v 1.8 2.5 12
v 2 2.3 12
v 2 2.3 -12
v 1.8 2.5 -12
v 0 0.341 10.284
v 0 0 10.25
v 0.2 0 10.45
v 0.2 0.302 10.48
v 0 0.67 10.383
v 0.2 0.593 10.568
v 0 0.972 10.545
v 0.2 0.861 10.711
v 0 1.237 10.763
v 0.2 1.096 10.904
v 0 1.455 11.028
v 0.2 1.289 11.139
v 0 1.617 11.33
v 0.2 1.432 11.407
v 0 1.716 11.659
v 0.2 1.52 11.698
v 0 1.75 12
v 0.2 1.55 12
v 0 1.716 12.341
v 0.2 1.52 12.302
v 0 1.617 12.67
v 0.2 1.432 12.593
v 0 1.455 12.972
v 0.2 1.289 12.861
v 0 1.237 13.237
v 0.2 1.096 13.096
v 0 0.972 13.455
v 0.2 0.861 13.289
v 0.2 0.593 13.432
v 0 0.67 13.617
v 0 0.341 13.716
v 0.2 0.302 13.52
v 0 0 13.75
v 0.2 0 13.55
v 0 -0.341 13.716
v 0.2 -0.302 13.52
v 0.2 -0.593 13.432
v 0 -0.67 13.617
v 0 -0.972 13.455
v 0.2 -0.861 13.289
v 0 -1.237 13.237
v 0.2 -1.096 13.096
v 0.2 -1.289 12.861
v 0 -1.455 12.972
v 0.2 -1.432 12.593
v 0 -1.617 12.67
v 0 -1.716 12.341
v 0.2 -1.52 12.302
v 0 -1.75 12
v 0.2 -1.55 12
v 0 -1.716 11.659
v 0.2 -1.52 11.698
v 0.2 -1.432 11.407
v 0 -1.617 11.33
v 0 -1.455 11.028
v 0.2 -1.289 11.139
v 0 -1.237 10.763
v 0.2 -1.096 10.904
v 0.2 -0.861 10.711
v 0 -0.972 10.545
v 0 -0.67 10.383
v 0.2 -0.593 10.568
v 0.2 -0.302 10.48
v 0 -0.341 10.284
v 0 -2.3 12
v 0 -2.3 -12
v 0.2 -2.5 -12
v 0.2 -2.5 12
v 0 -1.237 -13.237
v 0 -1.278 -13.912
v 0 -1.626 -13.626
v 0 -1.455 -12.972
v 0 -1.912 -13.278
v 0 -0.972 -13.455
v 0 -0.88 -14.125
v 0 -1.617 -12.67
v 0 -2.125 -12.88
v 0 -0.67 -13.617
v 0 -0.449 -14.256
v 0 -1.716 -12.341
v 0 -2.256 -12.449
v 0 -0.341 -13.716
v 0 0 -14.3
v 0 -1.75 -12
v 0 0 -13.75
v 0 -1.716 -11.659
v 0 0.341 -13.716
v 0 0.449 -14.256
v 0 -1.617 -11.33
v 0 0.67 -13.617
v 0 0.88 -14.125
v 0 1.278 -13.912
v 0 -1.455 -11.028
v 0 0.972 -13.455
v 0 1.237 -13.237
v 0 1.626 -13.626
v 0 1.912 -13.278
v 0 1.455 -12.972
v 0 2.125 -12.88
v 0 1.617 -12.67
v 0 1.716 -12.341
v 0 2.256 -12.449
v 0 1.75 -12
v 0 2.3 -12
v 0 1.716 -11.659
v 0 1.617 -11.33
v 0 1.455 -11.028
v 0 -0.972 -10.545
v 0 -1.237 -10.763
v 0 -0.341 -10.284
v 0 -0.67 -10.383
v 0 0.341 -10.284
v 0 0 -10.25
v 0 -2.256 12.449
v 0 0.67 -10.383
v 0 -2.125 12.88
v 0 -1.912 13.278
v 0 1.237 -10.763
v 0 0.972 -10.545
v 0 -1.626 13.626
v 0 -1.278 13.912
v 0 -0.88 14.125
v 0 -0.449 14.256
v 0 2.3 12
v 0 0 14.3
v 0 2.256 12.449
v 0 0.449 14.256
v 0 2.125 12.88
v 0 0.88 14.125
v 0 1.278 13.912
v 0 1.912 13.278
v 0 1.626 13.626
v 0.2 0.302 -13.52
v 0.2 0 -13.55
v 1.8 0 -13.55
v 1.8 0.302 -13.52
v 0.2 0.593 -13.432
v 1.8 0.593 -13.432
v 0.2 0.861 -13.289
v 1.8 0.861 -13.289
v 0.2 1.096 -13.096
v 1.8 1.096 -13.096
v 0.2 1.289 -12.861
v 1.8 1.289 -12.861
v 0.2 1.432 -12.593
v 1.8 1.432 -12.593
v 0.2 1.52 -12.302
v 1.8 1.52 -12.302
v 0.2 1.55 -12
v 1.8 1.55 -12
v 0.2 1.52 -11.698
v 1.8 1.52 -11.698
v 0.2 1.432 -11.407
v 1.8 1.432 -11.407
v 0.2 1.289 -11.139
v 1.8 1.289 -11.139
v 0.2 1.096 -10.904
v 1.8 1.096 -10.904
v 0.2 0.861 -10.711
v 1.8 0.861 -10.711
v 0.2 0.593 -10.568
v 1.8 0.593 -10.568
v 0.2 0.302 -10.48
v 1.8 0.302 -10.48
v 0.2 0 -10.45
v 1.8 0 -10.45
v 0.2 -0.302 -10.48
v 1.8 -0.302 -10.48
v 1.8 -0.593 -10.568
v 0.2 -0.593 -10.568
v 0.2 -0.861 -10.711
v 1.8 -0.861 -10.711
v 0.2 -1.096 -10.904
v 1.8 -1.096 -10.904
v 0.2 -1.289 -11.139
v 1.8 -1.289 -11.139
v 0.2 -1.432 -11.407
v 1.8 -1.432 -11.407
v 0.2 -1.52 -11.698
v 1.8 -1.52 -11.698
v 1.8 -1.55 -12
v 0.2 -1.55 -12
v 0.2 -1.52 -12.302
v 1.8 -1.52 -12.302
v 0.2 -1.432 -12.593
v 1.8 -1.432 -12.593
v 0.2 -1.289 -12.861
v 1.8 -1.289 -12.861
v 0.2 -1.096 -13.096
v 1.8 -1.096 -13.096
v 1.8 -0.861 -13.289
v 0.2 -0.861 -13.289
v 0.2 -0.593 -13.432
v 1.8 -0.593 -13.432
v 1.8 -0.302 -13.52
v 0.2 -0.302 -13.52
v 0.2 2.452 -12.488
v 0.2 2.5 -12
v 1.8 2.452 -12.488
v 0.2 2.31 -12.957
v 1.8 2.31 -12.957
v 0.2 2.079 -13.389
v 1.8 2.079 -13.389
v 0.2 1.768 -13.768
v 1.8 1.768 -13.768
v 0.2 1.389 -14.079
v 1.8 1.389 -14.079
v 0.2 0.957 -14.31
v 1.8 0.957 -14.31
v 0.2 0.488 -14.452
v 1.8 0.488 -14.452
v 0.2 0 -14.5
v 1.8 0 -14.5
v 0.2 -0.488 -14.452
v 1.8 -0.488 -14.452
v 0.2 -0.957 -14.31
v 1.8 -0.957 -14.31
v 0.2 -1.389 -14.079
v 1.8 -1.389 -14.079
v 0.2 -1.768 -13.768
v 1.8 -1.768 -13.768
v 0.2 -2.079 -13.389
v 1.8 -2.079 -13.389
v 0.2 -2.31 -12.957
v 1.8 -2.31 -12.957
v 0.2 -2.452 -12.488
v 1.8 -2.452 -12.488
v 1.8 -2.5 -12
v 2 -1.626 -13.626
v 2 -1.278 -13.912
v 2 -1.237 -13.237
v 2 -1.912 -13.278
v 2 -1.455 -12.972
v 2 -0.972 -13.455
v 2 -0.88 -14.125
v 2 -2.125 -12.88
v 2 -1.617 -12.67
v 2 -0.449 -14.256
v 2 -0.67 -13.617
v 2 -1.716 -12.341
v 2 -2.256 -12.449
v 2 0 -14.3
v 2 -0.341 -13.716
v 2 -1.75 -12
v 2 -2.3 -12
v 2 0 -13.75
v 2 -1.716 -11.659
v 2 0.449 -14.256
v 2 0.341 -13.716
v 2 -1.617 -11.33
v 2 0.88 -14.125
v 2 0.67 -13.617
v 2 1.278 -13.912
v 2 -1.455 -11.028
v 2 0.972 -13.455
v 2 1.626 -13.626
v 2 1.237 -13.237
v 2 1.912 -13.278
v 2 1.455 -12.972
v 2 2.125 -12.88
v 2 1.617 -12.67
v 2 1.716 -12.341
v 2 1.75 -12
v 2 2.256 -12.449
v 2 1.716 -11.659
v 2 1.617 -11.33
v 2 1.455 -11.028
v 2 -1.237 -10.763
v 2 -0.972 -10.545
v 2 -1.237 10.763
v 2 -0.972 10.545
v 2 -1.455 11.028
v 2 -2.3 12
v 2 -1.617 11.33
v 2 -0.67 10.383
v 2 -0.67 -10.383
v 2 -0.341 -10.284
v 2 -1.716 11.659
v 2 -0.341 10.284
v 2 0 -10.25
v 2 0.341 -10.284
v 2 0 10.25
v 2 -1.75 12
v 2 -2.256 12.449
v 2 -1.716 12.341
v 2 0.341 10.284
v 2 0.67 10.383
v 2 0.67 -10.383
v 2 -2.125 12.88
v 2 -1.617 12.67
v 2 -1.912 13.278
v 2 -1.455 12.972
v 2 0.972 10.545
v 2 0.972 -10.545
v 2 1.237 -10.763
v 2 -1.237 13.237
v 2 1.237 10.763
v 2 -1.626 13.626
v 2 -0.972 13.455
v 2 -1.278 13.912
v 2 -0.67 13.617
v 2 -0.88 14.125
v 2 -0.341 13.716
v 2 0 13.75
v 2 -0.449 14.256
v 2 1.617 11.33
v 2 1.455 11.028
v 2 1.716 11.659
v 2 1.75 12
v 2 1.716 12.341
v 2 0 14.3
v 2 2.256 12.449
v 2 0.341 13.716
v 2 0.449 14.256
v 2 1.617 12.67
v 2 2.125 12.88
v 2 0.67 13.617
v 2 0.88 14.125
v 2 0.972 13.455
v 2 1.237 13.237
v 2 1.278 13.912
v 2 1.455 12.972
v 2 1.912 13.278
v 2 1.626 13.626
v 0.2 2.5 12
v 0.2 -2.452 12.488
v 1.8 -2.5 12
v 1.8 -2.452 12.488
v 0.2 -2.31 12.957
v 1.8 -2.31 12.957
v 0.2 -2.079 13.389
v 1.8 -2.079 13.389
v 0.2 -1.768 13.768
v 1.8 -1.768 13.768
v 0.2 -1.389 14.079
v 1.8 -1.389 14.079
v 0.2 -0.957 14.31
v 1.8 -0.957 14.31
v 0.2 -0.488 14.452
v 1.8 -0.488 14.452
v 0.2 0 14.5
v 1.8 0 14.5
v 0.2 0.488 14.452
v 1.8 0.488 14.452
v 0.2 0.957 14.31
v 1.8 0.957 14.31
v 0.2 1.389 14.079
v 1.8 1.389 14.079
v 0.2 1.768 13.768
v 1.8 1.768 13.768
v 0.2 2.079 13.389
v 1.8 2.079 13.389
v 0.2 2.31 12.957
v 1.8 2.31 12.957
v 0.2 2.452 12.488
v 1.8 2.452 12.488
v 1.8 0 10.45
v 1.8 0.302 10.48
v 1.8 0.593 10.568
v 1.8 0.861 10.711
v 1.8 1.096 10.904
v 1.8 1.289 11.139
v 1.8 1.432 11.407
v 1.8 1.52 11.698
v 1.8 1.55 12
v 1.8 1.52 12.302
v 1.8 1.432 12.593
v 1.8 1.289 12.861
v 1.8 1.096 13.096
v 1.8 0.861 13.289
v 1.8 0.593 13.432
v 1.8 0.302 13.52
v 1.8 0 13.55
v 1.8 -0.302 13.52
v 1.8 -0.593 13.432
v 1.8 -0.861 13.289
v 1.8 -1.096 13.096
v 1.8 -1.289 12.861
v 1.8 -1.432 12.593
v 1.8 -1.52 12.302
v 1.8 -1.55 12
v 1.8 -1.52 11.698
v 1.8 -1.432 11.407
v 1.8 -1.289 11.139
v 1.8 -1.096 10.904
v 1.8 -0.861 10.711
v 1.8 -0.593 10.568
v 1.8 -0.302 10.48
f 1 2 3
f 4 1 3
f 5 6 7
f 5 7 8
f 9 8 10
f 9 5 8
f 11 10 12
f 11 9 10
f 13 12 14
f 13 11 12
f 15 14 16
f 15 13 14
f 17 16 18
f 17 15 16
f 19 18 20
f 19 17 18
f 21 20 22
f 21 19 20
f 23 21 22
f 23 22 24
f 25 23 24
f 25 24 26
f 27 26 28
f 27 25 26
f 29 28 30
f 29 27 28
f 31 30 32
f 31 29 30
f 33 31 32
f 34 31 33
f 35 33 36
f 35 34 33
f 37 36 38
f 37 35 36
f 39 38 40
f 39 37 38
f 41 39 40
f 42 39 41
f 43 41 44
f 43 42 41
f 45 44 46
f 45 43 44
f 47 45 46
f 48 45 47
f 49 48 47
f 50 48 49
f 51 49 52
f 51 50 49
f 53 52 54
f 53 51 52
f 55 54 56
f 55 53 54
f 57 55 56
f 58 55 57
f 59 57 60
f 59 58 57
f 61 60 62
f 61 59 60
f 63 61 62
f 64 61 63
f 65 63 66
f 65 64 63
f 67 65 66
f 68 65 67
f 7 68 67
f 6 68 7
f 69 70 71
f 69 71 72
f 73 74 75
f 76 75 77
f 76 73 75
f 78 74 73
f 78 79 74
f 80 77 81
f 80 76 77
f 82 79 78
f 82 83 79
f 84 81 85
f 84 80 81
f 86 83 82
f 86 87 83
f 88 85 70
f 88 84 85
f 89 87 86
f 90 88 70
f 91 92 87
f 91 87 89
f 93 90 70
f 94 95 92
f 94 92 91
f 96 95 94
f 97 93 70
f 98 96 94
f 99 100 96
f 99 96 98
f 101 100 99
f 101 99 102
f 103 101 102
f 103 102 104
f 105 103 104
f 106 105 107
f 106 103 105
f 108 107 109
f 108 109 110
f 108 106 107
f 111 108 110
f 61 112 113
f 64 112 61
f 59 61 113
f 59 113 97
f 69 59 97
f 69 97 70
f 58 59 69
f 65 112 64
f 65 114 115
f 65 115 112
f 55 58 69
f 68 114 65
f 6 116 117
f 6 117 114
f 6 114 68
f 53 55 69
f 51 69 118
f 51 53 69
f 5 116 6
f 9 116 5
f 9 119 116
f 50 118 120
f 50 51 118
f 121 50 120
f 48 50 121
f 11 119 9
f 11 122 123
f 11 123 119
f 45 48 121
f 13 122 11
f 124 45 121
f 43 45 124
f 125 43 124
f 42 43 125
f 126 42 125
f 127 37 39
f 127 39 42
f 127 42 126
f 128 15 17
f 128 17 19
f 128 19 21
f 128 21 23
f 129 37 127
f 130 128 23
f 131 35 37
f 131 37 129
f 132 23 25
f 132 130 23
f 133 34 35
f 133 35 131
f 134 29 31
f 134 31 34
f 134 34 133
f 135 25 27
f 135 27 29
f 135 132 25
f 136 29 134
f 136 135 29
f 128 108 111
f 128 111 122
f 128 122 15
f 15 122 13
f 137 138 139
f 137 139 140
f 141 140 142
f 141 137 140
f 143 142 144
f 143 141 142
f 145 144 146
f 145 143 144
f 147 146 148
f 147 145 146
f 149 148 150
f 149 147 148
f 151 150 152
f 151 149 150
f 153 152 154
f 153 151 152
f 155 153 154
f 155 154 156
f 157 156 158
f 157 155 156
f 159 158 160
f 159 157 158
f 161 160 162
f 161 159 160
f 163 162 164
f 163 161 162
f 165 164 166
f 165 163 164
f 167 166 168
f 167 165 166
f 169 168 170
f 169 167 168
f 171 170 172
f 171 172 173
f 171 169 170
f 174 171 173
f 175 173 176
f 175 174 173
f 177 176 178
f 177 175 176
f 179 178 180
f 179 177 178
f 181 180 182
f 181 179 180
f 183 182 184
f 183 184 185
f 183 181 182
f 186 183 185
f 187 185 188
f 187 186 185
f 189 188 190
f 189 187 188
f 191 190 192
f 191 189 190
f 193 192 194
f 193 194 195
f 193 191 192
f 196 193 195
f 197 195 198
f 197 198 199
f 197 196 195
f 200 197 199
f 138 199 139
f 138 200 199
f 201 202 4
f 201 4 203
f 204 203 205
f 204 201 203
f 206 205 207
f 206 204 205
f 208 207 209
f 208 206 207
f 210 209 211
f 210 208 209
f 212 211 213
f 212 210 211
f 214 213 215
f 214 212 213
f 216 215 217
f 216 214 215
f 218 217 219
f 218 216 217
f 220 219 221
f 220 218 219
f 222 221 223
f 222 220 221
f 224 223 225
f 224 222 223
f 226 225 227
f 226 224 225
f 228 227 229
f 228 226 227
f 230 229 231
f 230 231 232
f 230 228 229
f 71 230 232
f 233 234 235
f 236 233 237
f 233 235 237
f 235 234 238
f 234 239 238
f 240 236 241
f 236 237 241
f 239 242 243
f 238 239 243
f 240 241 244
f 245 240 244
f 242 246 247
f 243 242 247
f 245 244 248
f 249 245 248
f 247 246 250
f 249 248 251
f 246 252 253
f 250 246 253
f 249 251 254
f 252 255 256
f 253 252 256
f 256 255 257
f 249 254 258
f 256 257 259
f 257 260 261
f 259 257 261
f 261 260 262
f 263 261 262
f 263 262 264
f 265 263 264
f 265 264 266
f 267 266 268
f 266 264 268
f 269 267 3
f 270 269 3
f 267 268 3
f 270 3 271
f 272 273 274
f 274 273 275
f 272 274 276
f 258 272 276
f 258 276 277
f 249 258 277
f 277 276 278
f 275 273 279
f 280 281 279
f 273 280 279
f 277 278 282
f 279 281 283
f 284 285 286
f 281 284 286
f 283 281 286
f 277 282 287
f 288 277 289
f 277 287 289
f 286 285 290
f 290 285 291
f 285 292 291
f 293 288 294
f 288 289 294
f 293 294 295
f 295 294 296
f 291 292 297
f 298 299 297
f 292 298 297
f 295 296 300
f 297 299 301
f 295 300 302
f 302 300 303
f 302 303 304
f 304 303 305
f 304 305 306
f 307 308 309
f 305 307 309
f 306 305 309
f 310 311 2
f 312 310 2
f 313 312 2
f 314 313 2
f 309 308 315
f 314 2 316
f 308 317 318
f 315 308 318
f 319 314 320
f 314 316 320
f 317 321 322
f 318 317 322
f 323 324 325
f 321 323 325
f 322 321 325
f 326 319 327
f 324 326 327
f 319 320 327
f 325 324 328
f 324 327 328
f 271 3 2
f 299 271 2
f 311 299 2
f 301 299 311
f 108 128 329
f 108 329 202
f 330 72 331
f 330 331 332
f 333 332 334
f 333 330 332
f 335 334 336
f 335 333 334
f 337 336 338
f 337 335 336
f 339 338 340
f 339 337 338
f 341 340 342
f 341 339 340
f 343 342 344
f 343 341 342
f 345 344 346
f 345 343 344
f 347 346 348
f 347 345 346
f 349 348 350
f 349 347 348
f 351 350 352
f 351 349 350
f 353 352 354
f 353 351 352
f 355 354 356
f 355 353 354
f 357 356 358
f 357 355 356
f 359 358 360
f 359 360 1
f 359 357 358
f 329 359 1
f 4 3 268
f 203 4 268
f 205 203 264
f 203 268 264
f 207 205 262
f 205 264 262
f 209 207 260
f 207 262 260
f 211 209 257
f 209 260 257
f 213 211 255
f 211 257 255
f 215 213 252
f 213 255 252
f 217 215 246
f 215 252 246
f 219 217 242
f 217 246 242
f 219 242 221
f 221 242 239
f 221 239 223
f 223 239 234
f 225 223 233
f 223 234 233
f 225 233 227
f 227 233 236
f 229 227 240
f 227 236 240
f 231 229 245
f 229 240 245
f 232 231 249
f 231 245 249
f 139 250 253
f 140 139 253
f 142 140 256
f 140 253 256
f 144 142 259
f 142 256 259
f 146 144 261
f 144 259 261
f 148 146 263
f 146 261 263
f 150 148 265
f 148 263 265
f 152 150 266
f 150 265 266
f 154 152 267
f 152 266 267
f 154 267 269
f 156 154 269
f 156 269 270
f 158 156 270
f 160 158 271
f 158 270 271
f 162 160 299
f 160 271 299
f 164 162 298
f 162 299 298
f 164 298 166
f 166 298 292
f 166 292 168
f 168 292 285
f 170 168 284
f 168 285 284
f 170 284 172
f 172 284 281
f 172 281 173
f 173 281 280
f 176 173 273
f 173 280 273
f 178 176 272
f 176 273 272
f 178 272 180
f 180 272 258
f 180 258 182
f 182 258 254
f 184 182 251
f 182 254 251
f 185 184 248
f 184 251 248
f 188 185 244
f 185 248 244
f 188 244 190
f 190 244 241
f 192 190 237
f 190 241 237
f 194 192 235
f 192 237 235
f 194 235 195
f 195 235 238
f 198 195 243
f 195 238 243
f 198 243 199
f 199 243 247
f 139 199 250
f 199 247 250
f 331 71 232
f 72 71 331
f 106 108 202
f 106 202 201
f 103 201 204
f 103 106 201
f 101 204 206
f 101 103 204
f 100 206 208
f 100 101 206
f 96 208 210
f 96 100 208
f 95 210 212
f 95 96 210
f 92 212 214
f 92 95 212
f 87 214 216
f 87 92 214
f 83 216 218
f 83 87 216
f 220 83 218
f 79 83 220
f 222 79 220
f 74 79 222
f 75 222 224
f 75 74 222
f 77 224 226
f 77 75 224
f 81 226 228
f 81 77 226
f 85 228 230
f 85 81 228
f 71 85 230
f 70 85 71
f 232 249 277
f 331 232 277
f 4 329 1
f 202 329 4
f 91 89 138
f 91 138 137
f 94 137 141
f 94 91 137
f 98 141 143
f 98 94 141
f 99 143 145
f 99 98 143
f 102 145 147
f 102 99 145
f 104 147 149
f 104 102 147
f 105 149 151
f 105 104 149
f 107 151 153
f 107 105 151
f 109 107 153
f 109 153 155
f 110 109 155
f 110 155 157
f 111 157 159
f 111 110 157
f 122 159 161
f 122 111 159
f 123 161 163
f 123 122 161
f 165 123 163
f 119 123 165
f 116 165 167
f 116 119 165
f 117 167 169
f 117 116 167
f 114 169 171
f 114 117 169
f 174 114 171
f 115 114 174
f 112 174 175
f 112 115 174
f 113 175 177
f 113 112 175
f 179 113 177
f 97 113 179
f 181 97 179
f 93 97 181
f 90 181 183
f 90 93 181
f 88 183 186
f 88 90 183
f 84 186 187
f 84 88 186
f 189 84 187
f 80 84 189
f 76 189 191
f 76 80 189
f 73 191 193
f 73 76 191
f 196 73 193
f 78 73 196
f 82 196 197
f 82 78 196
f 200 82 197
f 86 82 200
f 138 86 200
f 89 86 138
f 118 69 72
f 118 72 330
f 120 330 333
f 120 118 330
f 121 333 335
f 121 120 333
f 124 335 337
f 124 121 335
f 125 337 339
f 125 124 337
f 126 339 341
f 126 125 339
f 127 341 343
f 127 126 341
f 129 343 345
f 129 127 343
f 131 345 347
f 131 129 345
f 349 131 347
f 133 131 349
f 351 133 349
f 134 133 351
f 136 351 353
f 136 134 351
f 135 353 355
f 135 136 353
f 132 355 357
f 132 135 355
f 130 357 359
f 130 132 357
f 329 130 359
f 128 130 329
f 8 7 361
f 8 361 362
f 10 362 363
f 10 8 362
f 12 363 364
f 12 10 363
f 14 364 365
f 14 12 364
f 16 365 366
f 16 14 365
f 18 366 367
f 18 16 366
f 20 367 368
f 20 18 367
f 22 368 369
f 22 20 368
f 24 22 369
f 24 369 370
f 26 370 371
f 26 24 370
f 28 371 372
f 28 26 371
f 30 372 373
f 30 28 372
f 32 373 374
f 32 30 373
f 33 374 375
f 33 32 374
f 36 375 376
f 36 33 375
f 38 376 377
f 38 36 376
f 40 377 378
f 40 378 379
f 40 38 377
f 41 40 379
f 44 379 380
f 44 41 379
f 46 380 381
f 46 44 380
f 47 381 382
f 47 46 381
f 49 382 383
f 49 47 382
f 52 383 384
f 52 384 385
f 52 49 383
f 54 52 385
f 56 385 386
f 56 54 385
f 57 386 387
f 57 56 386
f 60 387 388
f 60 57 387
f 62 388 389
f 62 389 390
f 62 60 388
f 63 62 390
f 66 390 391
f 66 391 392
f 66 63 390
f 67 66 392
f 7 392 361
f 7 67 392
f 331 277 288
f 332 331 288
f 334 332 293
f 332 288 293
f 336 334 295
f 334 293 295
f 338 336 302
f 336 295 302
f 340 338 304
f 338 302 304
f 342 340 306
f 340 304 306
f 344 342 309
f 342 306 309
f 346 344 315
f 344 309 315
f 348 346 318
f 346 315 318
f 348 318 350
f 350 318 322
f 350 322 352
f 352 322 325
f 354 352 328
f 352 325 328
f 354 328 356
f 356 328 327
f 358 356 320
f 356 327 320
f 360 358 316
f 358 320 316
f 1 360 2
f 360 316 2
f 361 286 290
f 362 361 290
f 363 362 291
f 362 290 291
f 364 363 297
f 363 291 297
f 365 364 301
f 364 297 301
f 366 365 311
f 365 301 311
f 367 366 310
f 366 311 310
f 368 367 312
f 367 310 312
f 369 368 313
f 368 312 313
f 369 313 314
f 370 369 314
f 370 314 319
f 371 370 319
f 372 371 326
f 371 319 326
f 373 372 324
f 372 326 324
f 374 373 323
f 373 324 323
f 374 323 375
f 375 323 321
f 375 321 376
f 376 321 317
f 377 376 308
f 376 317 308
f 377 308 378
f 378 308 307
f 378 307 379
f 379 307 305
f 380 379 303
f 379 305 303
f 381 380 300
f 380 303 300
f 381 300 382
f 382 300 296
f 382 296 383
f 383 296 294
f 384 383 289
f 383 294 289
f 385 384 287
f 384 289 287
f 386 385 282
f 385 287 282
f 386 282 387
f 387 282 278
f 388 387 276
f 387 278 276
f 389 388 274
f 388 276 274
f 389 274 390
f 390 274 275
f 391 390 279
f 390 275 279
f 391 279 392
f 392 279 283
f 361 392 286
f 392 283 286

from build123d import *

# Parameters (mm, degrees)
SKETCH1_R           = 1.55
BOSS_EXTRUDE1_DEPTH = 2
CHAMFER1_SIZE       = 0.2


with BuildPart() as part:
    # Sketch1 → Boss-Extrude1 (new body)
    with BuildSketch(Plane(origin=(0, 0, 0), x_dir=(0, 0, -1), z_dir=(1, 0, 0))):
        with BuildLine():
            Line((-12, 2.5), (12, 2.5))
            ThreePointArc((12, 2.5), (14.5, 0), (12, -2.5))
            Line((12, -2.5), (-12, -2.5))
            ThreePointArc((-12, -2.5), (-14.5, 0), (-12, 2.5))
        make_face()
        with Locations((-12, 0)):
            Circle(SKETCH1_R, mode=Mode.SUBTRACT)
        with Locations((12, 0)):
            Circle(SKETCH1_R, mode=Mode.SUBTRACT)
    extrude(amount=BOSS_EXTRUDE1_DEPTH)

    # Chamfer1
    chamfer1_edges = [part.edges().sort_by_distance(p)[0] for p in [
        (0, 0, 13.55),
        (2, 0, 13.55),
        (2, 0, -14.5),
        (0, 0, -10.45),
        (2, 0, -10.45),
        (2, 2.5, 0),
        (2, 0, 14.5),
        (0, 2.5, 0),
        (0, 0, -14.5),
        (0, -2.5, 0),
        (0, 0, 14.5),
        (2, -2.5, 0),
    ]]
    chamfer(chamfer1_edges, length=CHAMFER1_SIZE)


solid = part.part
